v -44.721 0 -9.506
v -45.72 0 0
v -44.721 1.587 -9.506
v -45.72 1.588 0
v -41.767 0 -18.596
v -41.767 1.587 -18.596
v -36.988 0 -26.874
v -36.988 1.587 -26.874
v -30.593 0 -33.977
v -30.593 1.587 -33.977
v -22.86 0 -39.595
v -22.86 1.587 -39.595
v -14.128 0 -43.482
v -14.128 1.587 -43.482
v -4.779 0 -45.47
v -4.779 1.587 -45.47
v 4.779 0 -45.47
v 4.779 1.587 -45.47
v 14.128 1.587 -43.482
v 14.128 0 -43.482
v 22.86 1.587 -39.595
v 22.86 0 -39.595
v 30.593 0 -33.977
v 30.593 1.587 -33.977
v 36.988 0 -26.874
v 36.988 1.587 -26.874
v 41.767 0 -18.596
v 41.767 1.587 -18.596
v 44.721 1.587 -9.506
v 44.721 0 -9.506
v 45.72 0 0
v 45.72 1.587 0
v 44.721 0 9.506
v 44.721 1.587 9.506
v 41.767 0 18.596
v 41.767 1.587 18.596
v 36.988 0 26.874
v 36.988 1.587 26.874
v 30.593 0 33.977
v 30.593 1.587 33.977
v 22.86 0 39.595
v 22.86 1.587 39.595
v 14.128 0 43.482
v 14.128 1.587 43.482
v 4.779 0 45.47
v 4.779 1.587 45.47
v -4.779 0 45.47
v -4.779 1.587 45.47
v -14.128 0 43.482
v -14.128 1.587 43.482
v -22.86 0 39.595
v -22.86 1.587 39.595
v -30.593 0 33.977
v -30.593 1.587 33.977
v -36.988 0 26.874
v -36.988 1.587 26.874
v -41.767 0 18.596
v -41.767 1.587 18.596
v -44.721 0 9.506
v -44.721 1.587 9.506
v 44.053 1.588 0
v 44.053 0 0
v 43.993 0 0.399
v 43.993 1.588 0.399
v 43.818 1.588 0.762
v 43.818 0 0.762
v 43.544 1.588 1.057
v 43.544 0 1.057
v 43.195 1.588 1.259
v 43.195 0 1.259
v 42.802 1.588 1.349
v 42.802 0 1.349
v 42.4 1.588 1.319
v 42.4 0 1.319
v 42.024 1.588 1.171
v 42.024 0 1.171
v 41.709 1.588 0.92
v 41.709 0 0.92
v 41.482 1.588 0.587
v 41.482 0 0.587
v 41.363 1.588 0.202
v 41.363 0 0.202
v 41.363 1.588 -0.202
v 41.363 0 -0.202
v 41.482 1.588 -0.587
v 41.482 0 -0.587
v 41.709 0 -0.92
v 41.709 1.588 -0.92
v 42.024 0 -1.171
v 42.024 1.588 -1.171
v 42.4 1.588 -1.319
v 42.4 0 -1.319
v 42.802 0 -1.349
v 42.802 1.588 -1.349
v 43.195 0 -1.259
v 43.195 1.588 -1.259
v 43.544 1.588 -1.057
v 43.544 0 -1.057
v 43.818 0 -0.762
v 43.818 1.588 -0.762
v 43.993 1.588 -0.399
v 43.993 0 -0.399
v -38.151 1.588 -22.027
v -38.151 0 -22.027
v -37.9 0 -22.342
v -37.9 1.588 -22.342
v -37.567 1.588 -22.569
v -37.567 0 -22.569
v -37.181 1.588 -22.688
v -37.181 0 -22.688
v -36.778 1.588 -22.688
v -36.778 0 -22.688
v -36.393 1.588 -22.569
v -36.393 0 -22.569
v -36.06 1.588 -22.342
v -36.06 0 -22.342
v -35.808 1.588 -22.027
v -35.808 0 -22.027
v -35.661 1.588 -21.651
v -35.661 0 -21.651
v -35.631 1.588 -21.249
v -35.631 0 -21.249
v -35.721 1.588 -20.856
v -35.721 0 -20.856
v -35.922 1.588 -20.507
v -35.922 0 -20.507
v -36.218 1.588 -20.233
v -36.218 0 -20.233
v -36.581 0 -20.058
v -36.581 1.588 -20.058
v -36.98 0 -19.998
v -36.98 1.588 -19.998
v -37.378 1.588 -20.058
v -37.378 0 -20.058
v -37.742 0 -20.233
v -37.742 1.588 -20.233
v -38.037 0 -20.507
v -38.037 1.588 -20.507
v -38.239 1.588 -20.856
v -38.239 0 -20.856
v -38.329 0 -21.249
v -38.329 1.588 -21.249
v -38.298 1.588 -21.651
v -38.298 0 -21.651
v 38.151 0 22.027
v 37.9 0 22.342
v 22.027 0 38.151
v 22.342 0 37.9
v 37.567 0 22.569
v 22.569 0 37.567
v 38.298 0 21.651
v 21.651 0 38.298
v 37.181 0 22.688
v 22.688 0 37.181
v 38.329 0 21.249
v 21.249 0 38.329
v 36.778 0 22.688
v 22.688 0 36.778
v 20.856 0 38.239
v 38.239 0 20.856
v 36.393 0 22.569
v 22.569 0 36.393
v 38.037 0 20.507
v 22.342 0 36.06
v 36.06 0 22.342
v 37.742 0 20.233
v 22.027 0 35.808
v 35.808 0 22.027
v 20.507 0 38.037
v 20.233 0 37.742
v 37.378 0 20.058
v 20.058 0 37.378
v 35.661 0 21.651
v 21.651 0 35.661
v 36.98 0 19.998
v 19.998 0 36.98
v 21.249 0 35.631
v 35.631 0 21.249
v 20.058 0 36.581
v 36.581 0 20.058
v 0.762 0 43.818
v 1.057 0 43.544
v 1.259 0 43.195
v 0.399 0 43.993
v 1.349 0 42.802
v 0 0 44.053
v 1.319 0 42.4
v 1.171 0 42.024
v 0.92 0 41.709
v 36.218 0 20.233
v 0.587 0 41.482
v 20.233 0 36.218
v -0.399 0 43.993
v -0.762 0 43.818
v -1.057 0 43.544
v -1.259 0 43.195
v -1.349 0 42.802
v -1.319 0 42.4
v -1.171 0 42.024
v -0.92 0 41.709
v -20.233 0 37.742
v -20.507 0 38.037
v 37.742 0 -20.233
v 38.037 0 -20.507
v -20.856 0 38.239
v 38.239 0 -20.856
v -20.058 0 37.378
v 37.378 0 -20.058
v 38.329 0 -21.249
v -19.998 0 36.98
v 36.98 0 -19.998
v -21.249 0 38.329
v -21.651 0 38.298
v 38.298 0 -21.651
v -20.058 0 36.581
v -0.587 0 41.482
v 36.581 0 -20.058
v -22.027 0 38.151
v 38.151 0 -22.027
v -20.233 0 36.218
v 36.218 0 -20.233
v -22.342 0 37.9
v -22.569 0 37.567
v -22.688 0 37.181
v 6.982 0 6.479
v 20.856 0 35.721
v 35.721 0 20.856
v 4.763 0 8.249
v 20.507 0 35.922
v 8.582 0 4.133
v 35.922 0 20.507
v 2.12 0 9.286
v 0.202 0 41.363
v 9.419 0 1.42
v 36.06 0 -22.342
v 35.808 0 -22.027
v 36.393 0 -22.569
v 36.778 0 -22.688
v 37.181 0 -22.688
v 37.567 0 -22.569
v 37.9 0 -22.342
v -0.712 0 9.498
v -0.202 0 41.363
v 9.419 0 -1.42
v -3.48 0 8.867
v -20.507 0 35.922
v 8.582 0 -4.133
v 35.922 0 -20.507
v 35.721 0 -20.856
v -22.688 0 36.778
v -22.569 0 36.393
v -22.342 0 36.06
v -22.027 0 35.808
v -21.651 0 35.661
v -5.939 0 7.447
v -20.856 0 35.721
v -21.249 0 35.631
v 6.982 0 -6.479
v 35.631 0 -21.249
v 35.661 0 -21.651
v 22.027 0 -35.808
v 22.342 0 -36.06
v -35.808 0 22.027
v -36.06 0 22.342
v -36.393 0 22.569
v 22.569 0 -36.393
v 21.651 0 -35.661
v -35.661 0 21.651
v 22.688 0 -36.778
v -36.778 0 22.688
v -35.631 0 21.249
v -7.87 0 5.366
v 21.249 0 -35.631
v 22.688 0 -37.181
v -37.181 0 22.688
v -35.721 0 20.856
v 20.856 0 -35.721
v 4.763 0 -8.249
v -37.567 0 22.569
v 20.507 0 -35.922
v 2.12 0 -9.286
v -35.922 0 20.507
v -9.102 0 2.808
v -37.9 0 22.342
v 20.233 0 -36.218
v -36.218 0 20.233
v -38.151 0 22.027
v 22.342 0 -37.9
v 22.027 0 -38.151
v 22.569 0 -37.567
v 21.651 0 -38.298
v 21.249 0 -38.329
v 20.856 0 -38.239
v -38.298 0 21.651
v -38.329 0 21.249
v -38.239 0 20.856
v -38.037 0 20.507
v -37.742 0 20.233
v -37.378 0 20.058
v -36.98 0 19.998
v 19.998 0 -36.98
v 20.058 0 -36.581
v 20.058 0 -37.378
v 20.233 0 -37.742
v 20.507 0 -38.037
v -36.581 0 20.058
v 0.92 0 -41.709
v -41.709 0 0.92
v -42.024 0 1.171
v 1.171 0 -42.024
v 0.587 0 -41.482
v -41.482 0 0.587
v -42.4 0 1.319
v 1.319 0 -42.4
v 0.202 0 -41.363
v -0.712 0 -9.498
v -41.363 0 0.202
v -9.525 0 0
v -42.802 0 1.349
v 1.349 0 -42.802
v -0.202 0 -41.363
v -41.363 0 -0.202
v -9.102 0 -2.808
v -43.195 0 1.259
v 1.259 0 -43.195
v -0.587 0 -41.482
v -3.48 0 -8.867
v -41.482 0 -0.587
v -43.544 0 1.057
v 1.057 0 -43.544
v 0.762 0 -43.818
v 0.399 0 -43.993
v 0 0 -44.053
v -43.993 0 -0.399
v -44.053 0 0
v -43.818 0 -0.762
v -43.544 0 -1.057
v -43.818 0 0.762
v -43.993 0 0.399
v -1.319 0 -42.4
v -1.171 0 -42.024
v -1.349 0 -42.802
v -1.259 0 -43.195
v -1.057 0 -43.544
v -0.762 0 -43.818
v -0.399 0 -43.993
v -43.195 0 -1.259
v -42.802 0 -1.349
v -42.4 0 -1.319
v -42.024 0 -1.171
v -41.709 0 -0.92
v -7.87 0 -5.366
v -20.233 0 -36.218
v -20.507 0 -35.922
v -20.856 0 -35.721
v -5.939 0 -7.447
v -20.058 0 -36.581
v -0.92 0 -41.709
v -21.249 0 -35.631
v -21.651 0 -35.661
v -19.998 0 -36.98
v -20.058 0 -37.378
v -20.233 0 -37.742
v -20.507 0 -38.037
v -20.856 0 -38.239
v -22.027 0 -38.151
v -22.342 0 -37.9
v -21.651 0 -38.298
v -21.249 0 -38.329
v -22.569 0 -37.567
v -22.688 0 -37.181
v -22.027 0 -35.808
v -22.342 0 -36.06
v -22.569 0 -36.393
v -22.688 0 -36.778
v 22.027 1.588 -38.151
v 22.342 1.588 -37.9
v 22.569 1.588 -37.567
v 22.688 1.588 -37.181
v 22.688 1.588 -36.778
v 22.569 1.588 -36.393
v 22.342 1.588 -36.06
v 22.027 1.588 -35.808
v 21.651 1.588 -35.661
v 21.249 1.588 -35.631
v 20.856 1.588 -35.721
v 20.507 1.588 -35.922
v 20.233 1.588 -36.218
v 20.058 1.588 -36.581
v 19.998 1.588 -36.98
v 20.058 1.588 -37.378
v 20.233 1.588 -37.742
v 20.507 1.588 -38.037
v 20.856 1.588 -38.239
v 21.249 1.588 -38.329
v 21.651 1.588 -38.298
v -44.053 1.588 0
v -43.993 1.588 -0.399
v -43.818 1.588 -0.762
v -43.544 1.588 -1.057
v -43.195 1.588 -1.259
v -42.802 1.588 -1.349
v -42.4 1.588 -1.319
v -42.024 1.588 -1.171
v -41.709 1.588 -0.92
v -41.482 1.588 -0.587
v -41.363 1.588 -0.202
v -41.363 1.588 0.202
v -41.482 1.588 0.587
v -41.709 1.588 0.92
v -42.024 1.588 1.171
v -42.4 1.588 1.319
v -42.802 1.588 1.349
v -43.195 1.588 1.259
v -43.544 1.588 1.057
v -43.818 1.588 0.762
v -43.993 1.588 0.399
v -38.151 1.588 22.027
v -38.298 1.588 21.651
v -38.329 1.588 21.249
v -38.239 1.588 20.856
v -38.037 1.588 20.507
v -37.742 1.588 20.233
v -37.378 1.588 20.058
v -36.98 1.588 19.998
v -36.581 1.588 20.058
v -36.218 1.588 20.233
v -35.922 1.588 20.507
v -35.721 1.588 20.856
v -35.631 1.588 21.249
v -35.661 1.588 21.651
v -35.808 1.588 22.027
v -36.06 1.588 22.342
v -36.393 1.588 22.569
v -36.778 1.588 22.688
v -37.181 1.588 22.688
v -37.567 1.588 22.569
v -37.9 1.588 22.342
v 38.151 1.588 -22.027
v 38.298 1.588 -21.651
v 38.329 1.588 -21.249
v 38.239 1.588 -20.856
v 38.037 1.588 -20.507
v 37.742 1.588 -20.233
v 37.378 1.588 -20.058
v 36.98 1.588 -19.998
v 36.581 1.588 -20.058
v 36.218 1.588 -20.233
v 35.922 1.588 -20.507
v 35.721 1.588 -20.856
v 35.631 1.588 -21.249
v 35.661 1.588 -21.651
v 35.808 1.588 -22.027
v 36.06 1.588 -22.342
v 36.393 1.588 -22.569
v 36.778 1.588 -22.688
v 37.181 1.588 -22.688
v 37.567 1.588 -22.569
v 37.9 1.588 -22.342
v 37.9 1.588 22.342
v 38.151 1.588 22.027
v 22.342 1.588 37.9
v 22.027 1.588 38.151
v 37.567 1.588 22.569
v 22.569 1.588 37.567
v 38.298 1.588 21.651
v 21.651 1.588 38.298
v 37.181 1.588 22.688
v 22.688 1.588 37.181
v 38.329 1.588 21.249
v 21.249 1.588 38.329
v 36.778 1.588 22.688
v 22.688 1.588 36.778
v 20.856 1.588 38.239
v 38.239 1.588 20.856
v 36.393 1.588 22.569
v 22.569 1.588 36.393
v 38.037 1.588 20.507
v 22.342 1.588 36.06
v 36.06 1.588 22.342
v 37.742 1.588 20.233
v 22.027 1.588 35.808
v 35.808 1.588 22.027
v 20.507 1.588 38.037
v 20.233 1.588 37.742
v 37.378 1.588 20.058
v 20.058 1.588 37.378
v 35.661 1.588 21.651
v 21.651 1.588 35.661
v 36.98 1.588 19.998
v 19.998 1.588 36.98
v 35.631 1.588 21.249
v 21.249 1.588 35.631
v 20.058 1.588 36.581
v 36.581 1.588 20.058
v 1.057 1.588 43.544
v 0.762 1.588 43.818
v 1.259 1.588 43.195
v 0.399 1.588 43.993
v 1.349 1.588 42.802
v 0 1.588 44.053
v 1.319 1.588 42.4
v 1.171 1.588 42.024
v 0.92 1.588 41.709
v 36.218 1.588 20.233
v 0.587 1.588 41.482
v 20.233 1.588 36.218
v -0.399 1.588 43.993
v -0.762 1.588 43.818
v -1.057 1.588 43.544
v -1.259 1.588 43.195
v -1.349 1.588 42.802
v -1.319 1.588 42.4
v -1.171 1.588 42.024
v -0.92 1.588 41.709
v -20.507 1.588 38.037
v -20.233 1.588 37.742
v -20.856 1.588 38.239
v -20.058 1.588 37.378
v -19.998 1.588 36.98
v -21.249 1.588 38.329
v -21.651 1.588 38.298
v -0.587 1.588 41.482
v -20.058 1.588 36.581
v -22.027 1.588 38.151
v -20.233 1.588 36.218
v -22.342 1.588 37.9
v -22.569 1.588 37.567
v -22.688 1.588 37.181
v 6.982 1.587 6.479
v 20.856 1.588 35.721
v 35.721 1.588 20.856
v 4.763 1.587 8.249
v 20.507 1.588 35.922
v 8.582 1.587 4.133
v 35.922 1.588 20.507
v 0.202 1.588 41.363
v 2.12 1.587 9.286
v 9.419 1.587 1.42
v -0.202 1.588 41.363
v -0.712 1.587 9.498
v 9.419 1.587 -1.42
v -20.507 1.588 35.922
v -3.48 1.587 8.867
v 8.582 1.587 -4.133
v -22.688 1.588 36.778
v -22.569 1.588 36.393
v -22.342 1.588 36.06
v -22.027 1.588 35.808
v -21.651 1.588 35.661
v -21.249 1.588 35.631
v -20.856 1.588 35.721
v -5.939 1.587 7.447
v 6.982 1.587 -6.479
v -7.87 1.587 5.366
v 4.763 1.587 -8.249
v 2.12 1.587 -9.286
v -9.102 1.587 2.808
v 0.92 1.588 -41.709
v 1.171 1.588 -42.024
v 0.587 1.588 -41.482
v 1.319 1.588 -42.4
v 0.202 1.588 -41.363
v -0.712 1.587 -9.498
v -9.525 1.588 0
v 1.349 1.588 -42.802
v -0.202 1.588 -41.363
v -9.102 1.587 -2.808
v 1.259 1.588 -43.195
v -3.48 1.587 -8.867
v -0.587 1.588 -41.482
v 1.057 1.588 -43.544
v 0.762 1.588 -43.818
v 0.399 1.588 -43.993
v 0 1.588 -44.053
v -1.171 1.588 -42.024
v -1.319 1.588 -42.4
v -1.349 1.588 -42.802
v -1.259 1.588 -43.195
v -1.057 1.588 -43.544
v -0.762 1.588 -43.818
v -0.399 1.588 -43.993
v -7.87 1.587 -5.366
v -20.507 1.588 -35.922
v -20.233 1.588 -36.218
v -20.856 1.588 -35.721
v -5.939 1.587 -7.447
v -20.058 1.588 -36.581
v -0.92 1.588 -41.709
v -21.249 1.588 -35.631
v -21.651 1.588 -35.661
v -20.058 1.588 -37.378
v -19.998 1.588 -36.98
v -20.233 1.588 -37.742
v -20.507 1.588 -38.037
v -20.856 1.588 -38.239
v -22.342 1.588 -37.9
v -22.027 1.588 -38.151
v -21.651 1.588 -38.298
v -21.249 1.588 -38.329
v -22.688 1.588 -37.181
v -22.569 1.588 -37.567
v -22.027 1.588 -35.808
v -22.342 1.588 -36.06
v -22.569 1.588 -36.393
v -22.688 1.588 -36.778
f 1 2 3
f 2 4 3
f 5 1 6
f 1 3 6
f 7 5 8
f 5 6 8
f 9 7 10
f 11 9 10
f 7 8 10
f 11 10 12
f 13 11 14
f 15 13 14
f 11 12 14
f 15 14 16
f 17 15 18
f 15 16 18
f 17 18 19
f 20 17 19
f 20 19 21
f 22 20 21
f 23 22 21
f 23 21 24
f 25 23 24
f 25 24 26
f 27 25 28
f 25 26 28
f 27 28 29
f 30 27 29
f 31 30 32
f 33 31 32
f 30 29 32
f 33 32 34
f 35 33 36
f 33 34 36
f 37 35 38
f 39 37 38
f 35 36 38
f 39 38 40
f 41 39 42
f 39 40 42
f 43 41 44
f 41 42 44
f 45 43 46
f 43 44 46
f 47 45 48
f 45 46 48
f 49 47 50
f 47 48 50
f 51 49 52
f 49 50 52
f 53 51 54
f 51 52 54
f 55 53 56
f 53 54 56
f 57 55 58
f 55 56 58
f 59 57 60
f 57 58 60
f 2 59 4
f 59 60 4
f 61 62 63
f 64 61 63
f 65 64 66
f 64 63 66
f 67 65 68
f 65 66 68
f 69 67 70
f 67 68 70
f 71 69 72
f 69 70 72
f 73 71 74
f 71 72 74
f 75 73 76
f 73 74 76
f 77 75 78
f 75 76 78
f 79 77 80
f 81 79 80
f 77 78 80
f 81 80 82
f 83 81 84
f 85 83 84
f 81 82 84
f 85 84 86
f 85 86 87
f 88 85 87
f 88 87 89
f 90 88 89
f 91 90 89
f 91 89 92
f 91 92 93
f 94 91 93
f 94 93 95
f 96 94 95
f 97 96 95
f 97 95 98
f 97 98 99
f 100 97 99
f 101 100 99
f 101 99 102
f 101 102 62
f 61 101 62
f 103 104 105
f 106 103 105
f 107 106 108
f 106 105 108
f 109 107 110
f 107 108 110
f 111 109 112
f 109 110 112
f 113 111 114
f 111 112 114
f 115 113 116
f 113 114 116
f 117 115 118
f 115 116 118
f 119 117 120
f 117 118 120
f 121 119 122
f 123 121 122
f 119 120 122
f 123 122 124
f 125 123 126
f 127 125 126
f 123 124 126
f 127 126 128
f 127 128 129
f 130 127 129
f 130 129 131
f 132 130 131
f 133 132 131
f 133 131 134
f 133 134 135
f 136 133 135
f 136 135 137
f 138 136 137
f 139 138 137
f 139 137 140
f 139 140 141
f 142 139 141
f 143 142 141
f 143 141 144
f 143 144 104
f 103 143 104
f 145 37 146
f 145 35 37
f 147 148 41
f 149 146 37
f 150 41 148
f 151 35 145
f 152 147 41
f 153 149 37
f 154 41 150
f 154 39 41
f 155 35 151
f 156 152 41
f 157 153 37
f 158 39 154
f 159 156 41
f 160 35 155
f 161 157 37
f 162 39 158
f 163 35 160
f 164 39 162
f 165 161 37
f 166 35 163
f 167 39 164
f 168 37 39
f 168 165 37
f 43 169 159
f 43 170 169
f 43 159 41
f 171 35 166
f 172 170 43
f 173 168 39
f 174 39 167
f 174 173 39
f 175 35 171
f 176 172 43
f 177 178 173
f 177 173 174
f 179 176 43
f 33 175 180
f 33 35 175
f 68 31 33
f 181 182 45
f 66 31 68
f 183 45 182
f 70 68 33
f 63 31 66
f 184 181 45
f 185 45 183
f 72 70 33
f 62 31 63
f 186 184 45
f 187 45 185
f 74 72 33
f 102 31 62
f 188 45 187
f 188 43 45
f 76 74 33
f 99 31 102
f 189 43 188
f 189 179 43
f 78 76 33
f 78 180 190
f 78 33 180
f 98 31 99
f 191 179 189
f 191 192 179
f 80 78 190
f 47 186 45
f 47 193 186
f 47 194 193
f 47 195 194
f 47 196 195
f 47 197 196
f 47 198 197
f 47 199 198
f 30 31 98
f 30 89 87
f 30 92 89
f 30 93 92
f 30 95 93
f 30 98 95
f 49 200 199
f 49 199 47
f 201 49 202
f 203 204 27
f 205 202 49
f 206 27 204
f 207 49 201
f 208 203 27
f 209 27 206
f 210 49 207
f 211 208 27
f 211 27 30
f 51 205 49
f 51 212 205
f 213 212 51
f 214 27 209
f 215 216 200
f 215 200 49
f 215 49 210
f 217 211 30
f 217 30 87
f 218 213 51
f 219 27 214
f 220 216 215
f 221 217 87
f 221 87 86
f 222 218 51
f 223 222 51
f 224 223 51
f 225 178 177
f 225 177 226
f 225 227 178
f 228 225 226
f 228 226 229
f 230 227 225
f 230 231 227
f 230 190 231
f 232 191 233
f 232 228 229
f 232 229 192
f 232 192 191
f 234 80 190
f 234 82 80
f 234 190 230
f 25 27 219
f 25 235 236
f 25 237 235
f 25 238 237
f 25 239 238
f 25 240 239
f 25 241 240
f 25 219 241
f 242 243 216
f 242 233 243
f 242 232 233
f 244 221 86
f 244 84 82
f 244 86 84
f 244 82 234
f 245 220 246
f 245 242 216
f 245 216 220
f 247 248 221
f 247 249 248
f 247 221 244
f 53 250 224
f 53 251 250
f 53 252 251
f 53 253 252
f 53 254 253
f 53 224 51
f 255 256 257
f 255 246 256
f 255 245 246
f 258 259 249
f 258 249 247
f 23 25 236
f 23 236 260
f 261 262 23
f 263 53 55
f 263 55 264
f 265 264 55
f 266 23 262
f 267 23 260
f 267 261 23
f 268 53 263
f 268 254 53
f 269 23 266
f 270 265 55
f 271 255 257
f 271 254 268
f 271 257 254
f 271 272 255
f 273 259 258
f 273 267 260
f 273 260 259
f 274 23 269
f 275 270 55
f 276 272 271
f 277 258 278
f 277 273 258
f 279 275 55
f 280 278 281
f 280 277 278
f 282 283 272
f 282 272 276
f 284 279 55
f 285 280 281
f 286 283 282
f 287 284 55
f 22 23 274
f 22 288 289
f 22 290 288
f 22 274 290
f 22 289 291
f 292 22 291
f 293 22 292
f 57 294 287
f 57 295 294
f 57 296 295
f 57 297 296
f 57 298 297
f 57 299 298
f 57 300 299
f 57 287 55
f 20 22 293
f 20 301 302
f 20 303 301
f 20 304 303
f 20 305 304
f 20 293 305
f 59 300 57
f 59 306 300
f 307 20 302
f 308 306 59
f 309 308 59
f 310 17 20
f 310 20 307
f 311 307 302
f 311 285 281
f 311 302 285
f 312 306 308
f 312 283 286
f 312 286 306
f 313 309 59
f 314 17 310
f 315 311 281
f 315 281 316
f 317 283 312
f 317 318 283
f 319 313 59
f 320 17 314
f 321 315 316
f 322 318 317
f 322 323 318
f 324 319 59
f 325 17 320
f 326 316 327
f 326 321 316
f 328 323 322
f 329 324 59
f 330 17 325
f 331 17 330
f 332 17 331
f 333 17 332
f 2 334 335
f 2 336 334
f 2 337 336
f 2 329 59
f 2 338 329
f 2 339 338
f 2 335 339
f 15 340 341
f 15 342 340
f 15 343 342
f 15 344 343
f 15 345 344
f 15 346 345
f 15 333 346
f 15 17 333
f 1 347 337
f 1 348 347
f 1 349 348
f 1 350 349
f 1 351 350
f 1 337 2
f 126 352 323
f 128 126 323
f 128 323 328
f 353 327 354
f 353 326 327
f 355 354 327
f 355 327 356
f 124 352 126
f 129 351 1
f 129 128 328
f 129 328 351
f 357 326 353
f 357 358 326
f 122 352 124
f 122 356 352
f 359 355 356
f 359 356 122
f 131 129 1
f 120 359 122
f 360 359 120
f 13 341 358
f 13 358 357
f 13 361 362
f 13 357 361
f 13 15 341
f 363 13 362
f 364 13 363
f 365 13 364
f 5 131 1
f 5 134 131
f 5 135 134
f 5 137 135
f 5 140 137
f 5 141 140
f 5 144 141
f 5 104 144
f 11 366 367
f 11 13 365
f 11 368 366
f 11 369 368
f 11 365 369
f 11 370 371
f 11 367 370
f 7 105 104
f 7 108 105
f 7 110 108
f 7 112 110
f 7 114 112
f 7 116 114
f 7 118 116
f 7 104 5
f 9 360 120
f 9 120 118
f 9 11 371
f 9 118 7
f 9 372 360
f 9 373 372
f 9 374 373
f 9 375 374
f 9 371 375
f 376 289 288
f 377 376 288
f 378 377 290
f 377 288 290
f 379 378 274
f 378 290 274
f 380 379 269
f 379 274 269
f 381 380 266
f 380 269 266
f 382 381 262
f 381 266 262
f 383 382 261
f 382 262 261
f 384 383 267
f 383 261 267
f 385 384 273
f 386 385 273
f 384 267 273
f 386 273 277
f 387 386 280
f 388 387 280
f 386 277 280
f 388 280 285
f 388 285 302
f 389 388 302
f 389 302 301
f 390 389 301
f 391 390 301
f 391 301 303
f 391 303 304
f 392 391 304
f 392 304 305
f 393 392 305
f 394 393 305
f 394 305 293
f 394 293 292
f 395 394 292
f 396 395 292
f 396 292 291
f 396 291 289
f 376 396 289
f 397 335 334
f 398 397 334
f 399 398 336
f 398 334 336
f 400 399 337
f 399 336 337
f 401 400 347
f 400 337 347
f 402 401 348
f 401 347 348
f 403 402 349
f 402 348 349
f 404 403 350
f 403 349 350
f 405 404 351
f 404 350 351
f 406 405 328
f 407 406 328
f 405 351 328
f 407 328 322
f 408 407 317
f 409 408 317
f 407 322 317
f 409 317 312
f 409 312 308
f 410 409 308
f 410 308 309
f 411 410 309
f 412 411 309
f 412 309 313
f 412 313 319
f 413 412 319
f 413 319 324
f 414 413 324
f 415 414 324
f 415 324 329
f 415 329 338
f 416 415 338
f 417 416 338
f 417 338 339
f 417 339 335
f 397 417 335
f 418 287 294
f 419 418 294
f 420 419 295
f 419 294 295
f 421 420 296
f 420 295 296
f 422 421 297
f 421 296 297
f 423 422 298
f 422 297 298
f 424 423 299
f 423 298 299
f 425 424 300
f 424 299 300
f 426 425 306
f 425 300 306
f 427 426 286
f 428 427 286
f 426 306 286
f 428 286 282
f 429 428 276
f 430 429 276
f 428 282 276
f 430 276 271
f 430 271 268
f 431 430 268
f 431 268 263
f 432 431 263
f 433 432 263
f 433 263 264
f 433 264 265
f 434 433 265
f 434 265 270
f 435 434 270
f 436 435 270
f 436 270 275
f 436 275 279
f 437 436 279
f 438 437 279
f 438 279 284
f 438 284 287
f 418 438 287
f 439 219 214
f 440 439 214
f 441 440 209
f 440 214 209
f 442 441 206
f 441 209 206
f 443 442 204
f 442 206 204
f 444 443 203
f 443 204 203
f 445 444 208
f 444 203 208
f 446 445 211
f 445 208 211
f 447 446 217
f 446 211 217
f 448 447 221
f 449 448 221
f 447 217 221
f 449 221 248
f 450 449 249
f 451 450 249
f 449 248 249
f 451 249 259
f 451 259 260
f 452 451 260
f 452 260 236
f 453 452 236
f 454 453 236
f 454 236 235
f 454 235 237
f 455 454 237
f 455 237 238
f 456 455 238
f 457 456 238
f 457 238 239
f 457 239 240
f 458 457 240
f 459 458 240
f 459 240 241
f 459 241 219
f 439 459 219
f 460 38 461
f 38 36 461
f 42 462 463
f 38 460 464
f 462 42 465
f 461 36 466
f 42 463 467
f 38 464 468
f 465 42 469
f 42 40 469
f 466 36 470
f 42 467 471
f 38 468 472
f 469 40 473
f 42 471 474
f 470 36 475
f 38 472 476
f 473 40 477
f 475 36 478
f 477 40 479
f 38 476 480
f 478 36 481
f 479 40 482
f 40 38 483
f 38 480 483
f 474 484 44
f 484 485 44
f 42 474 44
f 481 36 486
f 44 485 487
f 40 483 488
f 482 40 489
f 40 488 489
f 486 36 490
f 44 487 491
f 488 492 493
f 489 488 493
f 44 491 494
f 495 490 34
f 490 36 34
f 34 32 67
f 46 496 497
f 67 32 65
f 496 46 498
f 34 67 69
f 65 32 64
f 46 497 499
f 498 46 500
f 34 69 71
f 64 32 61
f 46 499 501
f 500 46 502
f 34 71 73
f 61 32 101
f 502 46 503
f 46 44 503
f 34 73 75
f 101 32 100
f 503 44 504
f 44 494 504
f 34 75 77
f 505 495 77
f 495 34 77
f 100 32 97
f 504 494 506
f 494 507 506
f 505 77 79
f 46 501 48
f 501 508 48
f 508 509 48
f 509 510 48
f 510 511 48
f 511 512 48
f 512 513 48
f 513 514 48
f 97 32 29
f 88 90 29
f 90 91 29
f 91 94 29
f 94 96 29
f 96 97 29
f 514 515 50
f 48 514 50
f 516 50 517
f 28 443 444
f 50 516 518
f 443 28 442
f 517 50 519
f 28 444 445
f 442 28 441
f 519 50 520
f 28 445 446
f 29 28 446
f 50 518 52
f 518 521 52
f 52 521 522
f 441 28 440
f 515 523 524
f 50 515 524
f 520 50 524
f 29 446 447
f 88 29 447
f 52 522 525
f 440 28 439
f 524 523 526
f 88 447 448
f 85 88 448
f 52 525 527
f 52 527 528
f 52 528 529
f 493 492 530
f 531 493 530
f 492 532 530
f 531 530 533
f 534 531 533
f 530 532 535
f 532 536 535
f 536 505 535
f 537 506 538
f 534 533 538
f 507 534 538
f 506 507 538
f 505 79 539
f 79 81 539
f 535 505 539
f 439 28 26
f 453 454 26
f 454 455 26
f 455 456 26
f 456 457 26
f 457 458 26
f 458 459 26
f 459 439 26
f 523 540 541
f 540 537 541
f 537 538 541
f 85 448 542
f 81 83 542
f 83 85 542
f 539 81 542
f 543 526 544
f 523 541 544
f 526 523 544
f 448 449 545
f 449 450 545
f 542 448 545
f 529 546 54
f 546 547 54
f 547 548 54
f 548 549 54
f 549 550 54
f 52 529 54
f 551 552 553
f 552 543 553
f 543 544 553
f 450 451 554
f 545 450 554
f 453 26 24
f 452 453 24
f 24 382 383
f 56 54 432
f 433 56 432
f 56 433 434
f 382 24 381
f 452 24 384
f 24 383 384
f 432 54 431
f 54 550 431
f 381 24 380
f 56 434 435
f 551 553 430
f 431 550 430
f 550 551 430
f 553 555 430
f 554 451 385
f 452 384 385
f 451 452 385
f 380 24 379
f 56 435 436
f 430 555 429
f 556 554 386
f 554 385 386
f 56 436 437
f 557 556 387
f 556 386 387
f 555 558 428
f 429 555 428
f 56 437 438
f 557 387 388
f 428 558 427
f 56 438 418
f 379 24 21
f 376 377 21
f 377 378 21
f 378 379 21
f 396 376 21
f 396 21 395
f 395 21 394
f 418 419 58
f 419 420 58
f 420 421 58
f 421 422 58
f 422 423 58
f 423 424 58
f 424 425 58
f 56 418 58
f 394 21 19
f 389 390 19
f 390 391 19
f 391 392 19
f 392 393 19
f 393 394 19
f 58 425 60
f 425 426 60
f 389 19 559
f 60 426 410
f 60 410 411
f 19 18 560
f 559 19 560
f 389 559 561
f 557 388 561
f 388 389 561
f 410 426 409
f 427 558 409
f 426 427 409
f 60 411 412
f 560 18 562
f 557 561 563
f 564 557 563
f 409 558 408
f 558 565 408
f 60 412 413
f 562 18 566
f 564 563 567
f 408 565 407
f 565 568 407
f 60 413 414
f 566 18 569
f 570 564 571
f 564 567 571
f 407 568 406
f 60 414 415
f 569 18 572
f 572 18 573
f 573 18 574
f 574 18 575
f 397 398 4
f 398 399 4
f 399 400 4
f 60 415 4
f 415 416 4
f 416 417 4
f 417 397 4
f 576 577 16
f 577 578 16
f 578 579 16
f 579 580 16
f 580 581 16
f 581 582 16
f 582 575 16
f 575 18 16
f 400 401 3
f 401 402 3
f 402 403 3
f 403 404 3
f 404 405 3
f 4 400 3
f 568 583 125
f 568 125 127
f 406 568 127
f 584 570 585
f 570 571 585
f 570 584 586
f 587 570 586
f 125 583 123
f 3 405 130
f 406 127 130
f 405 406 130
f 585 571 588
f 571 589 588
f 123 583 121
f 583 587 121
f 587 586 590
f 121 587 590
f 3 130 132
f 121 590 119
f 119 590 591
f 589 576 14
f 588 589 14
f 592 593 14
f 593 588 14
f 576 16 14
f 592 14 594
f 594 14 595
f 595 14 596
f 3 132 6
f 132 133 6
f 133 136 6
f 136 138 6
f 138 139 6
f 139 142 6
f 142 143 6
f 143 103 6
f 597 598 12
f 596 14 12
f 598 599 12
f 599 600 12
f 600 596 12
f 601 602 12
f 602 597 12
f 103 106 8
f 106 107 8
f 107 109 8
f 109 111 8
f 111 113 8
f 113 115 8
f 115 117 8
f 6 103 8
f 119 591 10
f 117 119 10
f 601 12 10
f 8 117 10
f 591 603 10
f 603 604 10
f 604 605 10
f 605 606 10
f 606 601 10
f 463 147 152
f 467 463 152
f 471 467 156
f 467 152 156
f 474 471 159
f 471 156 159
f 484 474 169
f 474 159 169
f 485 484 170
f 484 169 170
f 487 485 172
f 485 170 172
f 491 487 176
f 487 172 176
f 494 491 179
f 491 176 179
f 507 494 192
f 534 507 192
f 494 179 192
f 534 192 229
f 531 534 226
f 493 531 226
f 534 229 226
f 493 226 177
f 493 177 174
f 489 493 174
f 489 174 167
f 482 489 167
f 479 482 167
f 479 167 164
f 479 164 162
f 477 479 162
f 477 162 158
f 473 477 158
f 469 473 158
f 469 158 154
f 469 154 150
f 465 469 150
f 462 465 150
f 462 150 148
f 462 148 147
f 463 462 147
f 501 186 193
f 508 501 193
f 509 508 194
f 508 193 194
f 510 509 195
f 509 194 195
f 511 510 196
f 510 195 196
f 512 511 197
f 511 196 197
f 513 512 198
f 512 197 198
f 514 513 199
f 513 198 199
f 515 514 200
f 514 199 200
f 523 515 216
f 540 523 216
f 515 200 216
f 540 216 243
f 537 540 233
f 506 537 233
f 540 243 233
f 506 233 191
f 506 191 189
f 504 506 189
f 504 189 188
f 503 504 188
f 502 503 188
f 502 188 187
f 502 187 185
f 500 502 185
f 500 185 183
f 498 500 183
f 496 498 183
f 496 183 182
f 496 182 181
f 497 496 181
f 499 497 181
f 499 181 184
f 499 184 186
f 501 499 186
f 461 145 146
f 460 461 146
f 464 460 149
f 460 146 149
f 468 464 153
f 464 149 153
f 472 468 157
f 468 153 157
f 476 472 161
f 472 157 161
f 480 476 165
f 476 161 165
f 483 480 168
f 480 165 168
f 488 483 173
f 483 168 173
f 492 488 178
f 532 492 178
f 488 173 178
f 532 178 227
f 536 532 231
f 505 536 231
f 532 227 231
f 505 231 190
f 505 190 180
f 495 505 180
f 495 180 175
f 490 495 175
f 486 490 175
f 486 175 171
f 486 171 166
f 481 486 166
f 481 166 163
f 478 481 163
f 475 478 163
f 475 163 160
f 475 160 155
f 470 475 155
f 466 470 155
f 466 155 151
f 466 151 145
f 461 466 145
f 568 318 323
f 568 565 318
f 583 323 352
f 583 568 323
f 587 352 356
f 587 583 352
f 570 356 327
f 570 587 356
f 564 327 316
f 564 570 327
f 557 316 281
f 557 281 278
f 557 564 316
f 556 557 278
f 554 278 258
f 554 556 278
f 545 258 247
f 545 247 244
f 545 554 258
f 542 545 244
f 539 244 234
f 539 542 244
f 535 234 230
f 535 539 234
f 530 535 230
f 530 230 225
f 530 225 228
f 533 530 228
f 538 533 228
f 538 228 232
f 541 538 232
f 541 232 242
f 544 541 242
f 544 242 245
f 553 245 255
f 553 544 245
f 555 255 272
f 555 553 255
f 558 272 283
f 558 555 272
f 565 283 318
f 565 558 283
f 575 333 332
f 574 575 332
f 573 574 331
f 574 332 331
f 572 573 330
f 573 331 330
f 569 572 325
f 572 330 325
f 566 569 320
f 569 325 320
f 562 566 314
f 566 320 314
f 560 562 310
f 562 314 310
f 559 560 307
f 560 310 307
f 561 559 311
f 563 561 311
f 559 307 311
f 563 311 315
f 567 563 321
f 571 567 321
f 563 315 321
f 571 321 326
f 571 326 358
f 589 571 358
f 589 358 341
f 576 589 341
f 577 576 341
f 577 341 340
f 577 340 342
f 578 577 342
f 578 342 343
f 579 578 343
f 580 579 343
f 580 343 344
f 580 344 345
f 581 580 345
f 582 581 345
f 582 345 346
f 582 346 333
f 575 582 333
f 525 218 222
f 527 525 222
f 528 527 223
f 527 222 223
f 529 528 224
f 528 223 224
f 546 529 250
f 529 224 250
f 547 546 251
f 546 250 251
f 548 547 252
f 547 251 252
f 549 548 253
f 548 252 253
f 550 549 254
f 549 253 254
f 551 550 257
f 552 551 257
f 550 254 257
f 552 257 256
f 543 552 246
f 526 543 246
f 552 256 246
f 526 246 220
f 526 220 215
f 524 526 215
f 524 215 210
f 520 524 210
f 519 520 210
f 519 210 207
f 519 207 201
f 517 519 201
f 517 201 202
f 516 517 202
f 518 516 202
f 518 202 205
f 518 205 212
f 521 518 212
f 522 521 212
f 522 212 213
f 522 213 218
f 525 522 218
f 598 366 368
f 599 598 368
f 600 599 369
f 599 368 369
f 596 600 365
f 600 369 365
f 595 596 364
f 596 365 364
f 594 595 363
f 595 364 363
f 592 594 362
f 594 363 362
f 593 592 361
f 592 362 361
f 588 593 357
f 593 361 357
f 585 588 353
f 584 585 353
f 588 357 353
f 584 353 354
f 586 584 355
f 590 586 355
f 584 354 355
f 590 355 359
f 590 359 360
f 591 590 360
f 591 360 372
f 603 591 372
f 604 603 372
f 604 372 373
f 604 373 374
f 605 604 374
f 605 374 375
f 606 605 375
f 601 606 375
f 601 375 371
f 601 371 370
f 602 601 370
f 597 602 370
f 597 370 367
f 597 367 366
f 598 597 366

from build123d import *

# Parameters (mm, degrees)
SKETCH1_W                    = 36.195
SKETCH1_H                    = 1.5875
F_36_0_1065_DIAMETER_HOLE1_D = 2.7051
CIRPATTERN1_COUNT            = 12


with BuildPart() as part:
    # Sketch1 → Revolve1 (revolve)
    with BuildSketch(Plane.XY):
        with Locations((-27.6225, 0.79375)):
            Rectangle(SKETCH1_W, SKETCH1_H)
    revolve(axis=Axis((0, 55, 0), (0, -1, 0)))

    # #36 (0.1065) Diameter Hole1 (through all)
    with Locations(Plane(origin=(0, 1.5875, 0), x_dir=(1, 0, 0), z_dir=(0, 1, 0))):
        with Locations((-42.700575, 0)):
            f_36_0_1065_diameter_hole1 = Hole(F_36_0_1065_DIAMETER_HOLE1_D / 2)

    # CirPattern1: #36 (0.1065) Diameter Hole1 ×12 about axis
    cirpattern1_axis = Axis((0, 0, 0), (0, 1, 0))
    for i in range(1, CIRPATTERN1_COUNT):
        add(f_36_0_1065_diameter_hole1.rotate(cirpattern1_axis, i * 360 / CIRPATTERN1_COUNT), mode=Mode.SUBTRACT)


solid = part.part
